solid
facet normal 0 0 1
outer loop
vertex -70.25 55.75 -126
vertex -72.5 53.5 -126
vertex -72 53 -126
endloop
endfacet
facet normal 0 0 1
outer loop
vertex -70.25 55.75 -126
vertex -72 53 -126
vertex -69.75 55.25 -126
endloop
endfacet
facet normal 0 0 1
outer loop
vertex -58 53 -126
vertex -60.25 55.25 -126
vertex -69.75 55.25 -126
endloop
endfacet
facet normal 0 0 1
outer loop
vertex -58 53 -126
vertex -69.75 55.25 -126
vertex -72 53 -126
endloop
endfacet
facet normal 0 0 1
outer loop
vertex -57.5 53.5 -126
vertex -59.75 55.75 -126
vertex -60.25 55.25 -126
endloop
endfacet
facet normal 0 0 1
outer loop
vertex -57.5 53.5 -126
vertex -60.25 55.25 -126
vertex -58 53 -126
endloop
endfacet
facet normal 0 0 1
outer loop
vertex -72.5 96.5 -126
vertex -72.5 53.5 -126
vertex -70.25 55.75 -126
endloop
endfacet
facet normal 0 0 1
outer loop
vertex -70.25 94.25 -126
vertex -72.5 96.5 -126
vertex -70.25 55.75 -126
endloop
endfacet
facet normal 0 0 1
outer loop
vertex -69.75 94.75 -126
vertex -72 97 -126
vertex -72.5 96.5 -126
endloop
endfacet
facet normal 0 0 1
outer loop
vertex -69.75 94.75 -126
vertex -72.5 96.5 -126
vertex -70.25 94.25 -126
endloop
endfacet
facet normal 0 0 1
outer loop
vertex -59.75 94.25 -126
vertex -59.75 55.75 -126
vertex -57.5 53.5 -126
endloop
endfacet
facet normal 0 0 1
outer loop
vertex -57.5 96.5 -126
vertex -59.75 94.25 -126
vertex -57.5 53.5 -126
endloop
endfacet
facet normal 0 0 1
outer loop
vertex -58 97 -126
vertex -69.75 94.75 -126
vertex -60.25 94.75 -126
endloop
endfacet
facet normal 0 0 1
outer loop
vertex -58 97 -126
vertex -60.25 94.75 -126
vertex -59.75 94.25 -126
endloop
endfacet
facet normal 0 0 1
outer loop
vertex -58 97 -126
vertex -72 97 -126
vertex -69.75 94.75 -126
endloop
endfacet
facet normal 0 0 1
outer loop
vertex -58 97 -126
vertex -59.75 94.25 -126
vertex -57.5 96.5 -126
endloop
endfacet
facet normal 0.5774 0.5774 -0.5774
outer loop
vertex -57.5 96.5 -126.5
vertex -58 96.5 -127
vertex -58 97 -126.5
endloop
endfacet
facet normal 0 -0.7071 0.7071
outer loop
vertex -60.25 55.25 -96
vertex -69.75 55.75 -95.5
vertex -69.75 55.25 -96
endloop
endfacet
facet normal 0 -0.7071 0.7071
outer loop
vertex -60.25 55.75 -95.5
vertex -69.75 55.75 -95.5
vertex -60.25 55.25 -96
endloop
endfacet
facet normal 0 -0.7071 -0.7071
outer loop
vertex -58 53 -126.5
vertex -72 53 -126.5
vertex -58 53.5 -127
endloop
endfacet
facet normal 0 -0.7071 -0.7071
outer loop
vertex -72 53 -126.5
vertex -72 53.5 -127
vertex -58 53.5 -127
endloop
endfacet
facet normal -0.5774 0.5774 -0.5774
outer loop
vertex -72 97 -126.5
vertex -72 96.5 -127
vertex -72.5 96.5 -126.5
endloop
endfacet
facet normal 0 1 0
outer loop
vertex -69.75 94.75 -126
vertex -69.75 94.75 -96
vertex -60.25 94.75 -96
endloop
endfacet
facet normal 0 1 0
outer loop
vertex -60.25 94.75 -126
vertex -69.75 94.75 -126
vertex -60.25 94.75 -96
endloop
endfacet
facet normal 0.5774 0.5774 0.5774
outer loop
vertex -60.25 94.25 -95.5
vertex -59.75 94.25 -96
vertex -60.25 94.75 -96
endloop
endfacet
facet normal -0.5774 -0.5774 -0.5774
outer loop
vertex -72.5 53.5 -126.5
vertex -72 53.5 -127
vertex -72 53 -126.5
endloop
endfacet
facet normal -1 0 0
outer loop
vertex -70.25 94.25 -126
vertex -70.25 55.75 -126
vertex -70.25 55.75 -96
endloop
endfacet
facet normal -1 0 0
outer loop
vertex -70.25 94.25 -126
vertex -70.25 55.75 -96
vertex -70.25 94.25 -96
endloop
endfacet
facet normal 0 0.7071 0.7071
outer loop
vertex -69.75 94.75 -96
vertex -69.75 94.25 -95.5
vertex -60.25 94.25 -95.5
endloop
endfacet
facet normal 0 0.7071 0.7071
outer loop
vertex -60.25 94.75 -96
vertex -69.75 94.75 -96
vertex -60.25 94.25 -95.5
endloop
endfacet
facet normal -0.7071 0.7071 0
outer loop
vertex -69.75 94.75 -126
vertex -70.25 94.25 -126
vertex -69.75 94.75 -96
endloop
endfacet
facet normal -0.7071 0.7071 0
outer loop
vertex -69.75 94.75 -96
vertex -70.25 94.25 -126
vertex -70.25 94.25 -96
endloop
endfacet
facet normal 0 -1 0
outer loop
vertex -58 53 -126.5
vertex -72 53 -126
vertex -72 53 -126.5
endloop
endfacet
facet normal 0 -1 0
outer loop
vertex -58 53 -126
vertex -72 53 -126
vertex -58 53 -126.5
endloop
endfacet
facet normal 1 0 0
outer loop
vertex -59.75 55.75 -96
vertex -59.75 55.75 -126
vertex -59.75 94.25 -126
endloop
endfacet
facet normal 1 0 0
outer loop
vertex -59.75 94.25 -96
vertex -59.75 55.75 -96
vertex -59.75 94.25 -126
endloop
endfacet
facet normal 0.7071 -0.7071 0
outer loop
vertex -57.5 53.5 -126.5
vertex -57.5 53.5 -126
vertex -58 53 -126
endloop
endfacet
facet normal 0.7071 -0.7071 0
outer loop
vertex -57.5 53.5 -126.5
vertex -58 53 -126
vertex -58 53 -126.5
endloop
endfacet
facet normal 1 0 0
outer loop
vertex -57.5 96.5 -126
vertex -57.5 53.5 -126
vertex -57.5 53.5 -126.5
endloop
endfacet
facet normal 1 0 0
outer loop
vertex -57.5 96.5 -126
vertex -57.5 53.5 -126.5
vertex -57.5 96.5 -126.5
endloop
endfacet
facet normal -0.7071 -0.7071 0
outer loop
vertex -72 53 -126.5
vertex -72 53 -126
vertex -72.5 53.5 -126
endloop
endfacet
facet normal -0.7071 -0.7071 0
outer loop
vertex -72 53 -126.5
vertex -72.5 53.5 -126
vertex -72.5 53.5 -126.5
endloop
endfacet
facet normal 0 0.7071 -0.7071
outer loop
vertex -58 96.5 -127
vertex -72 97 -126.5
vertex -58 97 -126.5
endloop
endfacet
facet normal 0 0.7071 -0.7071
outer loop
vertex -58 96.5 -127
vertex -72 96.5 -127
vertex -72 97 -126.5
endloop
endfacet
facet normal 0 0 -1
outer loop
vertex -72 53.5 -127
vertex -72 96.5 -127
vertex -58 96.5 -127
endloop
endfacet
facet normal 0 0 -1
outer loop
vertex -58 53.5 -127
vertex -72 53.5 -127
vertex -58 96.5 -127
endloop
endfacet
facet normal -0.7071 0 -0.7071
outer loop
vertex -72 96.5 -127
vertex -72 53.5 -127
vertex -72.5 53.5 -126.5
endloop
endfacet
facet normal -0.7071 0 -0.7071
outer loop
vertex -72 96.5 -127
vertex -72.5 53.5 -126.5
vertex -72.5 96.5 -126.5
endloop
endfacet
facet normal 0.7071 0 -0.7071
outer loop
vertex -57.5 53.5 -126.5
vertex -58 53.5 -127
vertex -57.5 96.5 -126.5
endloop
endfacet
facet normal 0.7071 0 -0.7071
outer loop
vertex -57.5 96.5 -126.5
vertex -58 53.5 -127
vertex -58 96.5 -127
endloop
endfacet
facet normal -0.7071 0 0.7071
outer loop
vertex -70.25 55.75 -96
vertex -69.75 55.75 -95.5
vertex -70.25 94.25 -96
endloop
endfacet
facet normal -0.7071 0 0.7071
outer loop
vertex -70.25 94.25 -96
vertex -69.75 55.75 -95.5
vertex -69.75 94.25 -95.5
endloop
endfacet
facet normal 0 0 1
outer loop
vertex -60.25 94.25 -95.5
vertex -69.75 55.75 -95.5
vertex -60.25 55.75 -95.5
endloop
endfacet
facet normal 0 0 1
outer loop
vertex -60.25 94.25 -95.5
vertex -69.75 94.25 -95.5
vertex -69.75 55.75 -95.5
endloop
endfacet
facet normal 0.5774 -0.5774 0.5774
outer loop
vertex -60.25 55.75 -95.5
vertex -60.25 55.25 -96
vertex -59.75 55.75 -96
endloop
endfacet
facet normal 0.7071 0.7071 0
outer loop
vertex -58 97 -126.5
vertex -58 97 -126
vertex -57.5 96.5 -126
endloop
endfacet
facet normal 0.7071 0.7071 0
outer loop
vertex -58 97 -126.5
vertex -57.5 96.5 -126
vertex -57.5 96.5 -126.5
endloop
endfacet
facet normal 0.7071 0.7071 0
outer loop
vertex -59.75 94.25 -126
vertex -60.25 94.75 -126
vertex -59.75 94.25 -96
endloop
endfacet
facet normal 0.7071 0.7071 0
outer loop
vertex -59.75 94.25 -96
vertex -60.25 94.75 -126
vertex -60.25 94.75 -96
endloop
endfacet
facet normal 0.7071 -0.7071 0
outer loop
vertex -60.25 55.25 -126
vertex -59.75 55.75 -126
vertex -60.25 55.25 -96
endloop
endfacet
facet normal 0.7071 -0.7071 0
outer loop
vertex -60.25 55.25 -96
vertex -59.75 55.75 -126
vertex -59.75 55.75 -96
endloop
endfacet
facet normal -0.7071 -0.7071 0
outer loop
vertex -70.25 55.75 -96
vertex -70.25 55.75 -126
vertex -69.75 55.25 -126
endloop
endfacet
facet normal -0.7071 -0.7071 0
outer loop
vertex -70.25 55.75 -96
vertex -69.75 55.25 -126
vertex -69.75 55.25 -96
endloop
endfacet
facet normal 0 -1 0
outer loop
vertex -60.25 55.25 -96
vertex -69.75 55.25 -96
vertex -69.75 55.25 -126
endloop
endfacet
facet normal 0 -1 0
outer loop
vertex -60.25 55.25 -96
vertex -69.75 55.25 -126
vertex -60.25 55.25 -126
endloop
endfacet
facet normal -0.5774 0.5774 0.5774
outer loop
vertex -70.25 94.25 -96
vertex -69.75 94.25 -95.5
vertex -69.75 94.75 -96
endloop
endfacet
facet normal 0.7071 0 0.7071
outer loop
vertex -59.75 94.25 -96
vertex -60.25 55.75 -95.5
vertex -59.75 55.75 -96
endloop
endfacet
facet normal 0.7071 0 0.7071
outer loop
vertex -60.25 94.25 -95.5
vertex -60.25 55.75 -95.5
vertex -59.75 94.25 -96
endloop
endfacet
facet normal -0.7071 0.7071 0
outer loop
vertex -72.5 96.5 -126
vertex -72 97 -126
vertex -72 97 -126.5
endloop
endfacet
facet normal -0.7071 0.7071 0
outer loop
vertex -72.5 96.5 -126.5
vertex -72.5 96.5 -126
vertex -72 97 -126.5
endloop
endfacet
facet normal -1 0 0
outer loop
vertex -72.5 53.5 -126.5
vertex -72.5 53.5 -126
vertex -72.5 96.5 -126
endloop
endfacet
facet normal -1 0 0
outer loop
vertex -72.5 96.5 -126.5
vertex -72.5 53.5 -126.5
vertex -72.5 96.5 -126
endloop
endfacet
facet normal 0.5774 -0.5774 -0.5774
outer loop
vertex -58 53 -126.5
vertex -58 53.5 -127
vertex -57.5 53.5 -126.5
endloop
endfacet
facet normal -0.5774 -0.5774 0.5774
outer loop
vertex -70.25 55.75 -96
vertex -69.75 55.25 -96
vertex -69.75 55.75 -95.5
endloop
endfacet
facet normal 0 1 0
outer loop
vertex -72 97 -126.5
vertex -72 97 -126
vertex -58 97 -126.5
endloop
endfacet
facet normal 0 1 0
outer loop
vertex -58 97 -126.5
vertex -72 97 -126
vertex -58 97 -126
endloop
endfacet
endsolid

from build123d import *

# Parameters (mm, degrees)
SKETCH052_W     = 15
SKETCH052_H     = 44
PAD029_DEPTH    = 1
SKETCH053_W     = 10.5
SKETCH053_H     = 39.5
PAD030_DEPTH    = 30.5
CHAMFER028_SIZE = 0.5
CHAMFER029_SIZE = 0.5


with BuildPart() as part:
    # Sketch052 → Pad029 (new body)
    with BuildSketch(Plane.XY):
        Rectangle(SKETCH052_W, SKETCH052_H)
    extrude(amount=-PAD029_DEPTH)

    # Sketch053 (on Face5 of Pad029) → Pad030 (join)
    with BuildSketch(Plane.XY):
        Rectangle(SKETCH053_W, SKETCH053_H)
    extrude(amount=PAD030_DEPTH)

    # Chamfer028
    chamfer028_edges = [part.edges().sort_by_distance(p)[0] for p in [
        (-5.25, -19.75, 15.25),
        (5.25, -19.75, 15.25),
        (0, -19.75, 30.5),
        (-5.25, 0, 30.5),
        (5.25, 0, 30.5),
        (5.25, 19.75, 15.25),
        (0, 19.75, 30.5),
        (-5.25, 19.75, 15.25),
    ]]
    chamfer(chamfer028_edges, length=CHAMFER028_SIZE)

    # Chamfer029
    chamfer029_edges = [part.edges().sort_by_distance(p)[0] for p in [
        (0, 22, -1),
        (7.5, 0, -1),
        (0, -22, -1),
        (-7.5, 0, -1),
        (-7.5, -22, -0.5),
        (7.5, -22, -0.5),
        (7.5, 22, -0.5),
        (-7.5, 22, -0.5),
    ]]
    chamfer(chamfer029_edges, length=CHAMFER029_SIZE)


with BuildPart() as part_1:
    # Body010 placement: moved
    add(part.part.moved(Location((-65, 75, -126))))


solid = part_1.part
